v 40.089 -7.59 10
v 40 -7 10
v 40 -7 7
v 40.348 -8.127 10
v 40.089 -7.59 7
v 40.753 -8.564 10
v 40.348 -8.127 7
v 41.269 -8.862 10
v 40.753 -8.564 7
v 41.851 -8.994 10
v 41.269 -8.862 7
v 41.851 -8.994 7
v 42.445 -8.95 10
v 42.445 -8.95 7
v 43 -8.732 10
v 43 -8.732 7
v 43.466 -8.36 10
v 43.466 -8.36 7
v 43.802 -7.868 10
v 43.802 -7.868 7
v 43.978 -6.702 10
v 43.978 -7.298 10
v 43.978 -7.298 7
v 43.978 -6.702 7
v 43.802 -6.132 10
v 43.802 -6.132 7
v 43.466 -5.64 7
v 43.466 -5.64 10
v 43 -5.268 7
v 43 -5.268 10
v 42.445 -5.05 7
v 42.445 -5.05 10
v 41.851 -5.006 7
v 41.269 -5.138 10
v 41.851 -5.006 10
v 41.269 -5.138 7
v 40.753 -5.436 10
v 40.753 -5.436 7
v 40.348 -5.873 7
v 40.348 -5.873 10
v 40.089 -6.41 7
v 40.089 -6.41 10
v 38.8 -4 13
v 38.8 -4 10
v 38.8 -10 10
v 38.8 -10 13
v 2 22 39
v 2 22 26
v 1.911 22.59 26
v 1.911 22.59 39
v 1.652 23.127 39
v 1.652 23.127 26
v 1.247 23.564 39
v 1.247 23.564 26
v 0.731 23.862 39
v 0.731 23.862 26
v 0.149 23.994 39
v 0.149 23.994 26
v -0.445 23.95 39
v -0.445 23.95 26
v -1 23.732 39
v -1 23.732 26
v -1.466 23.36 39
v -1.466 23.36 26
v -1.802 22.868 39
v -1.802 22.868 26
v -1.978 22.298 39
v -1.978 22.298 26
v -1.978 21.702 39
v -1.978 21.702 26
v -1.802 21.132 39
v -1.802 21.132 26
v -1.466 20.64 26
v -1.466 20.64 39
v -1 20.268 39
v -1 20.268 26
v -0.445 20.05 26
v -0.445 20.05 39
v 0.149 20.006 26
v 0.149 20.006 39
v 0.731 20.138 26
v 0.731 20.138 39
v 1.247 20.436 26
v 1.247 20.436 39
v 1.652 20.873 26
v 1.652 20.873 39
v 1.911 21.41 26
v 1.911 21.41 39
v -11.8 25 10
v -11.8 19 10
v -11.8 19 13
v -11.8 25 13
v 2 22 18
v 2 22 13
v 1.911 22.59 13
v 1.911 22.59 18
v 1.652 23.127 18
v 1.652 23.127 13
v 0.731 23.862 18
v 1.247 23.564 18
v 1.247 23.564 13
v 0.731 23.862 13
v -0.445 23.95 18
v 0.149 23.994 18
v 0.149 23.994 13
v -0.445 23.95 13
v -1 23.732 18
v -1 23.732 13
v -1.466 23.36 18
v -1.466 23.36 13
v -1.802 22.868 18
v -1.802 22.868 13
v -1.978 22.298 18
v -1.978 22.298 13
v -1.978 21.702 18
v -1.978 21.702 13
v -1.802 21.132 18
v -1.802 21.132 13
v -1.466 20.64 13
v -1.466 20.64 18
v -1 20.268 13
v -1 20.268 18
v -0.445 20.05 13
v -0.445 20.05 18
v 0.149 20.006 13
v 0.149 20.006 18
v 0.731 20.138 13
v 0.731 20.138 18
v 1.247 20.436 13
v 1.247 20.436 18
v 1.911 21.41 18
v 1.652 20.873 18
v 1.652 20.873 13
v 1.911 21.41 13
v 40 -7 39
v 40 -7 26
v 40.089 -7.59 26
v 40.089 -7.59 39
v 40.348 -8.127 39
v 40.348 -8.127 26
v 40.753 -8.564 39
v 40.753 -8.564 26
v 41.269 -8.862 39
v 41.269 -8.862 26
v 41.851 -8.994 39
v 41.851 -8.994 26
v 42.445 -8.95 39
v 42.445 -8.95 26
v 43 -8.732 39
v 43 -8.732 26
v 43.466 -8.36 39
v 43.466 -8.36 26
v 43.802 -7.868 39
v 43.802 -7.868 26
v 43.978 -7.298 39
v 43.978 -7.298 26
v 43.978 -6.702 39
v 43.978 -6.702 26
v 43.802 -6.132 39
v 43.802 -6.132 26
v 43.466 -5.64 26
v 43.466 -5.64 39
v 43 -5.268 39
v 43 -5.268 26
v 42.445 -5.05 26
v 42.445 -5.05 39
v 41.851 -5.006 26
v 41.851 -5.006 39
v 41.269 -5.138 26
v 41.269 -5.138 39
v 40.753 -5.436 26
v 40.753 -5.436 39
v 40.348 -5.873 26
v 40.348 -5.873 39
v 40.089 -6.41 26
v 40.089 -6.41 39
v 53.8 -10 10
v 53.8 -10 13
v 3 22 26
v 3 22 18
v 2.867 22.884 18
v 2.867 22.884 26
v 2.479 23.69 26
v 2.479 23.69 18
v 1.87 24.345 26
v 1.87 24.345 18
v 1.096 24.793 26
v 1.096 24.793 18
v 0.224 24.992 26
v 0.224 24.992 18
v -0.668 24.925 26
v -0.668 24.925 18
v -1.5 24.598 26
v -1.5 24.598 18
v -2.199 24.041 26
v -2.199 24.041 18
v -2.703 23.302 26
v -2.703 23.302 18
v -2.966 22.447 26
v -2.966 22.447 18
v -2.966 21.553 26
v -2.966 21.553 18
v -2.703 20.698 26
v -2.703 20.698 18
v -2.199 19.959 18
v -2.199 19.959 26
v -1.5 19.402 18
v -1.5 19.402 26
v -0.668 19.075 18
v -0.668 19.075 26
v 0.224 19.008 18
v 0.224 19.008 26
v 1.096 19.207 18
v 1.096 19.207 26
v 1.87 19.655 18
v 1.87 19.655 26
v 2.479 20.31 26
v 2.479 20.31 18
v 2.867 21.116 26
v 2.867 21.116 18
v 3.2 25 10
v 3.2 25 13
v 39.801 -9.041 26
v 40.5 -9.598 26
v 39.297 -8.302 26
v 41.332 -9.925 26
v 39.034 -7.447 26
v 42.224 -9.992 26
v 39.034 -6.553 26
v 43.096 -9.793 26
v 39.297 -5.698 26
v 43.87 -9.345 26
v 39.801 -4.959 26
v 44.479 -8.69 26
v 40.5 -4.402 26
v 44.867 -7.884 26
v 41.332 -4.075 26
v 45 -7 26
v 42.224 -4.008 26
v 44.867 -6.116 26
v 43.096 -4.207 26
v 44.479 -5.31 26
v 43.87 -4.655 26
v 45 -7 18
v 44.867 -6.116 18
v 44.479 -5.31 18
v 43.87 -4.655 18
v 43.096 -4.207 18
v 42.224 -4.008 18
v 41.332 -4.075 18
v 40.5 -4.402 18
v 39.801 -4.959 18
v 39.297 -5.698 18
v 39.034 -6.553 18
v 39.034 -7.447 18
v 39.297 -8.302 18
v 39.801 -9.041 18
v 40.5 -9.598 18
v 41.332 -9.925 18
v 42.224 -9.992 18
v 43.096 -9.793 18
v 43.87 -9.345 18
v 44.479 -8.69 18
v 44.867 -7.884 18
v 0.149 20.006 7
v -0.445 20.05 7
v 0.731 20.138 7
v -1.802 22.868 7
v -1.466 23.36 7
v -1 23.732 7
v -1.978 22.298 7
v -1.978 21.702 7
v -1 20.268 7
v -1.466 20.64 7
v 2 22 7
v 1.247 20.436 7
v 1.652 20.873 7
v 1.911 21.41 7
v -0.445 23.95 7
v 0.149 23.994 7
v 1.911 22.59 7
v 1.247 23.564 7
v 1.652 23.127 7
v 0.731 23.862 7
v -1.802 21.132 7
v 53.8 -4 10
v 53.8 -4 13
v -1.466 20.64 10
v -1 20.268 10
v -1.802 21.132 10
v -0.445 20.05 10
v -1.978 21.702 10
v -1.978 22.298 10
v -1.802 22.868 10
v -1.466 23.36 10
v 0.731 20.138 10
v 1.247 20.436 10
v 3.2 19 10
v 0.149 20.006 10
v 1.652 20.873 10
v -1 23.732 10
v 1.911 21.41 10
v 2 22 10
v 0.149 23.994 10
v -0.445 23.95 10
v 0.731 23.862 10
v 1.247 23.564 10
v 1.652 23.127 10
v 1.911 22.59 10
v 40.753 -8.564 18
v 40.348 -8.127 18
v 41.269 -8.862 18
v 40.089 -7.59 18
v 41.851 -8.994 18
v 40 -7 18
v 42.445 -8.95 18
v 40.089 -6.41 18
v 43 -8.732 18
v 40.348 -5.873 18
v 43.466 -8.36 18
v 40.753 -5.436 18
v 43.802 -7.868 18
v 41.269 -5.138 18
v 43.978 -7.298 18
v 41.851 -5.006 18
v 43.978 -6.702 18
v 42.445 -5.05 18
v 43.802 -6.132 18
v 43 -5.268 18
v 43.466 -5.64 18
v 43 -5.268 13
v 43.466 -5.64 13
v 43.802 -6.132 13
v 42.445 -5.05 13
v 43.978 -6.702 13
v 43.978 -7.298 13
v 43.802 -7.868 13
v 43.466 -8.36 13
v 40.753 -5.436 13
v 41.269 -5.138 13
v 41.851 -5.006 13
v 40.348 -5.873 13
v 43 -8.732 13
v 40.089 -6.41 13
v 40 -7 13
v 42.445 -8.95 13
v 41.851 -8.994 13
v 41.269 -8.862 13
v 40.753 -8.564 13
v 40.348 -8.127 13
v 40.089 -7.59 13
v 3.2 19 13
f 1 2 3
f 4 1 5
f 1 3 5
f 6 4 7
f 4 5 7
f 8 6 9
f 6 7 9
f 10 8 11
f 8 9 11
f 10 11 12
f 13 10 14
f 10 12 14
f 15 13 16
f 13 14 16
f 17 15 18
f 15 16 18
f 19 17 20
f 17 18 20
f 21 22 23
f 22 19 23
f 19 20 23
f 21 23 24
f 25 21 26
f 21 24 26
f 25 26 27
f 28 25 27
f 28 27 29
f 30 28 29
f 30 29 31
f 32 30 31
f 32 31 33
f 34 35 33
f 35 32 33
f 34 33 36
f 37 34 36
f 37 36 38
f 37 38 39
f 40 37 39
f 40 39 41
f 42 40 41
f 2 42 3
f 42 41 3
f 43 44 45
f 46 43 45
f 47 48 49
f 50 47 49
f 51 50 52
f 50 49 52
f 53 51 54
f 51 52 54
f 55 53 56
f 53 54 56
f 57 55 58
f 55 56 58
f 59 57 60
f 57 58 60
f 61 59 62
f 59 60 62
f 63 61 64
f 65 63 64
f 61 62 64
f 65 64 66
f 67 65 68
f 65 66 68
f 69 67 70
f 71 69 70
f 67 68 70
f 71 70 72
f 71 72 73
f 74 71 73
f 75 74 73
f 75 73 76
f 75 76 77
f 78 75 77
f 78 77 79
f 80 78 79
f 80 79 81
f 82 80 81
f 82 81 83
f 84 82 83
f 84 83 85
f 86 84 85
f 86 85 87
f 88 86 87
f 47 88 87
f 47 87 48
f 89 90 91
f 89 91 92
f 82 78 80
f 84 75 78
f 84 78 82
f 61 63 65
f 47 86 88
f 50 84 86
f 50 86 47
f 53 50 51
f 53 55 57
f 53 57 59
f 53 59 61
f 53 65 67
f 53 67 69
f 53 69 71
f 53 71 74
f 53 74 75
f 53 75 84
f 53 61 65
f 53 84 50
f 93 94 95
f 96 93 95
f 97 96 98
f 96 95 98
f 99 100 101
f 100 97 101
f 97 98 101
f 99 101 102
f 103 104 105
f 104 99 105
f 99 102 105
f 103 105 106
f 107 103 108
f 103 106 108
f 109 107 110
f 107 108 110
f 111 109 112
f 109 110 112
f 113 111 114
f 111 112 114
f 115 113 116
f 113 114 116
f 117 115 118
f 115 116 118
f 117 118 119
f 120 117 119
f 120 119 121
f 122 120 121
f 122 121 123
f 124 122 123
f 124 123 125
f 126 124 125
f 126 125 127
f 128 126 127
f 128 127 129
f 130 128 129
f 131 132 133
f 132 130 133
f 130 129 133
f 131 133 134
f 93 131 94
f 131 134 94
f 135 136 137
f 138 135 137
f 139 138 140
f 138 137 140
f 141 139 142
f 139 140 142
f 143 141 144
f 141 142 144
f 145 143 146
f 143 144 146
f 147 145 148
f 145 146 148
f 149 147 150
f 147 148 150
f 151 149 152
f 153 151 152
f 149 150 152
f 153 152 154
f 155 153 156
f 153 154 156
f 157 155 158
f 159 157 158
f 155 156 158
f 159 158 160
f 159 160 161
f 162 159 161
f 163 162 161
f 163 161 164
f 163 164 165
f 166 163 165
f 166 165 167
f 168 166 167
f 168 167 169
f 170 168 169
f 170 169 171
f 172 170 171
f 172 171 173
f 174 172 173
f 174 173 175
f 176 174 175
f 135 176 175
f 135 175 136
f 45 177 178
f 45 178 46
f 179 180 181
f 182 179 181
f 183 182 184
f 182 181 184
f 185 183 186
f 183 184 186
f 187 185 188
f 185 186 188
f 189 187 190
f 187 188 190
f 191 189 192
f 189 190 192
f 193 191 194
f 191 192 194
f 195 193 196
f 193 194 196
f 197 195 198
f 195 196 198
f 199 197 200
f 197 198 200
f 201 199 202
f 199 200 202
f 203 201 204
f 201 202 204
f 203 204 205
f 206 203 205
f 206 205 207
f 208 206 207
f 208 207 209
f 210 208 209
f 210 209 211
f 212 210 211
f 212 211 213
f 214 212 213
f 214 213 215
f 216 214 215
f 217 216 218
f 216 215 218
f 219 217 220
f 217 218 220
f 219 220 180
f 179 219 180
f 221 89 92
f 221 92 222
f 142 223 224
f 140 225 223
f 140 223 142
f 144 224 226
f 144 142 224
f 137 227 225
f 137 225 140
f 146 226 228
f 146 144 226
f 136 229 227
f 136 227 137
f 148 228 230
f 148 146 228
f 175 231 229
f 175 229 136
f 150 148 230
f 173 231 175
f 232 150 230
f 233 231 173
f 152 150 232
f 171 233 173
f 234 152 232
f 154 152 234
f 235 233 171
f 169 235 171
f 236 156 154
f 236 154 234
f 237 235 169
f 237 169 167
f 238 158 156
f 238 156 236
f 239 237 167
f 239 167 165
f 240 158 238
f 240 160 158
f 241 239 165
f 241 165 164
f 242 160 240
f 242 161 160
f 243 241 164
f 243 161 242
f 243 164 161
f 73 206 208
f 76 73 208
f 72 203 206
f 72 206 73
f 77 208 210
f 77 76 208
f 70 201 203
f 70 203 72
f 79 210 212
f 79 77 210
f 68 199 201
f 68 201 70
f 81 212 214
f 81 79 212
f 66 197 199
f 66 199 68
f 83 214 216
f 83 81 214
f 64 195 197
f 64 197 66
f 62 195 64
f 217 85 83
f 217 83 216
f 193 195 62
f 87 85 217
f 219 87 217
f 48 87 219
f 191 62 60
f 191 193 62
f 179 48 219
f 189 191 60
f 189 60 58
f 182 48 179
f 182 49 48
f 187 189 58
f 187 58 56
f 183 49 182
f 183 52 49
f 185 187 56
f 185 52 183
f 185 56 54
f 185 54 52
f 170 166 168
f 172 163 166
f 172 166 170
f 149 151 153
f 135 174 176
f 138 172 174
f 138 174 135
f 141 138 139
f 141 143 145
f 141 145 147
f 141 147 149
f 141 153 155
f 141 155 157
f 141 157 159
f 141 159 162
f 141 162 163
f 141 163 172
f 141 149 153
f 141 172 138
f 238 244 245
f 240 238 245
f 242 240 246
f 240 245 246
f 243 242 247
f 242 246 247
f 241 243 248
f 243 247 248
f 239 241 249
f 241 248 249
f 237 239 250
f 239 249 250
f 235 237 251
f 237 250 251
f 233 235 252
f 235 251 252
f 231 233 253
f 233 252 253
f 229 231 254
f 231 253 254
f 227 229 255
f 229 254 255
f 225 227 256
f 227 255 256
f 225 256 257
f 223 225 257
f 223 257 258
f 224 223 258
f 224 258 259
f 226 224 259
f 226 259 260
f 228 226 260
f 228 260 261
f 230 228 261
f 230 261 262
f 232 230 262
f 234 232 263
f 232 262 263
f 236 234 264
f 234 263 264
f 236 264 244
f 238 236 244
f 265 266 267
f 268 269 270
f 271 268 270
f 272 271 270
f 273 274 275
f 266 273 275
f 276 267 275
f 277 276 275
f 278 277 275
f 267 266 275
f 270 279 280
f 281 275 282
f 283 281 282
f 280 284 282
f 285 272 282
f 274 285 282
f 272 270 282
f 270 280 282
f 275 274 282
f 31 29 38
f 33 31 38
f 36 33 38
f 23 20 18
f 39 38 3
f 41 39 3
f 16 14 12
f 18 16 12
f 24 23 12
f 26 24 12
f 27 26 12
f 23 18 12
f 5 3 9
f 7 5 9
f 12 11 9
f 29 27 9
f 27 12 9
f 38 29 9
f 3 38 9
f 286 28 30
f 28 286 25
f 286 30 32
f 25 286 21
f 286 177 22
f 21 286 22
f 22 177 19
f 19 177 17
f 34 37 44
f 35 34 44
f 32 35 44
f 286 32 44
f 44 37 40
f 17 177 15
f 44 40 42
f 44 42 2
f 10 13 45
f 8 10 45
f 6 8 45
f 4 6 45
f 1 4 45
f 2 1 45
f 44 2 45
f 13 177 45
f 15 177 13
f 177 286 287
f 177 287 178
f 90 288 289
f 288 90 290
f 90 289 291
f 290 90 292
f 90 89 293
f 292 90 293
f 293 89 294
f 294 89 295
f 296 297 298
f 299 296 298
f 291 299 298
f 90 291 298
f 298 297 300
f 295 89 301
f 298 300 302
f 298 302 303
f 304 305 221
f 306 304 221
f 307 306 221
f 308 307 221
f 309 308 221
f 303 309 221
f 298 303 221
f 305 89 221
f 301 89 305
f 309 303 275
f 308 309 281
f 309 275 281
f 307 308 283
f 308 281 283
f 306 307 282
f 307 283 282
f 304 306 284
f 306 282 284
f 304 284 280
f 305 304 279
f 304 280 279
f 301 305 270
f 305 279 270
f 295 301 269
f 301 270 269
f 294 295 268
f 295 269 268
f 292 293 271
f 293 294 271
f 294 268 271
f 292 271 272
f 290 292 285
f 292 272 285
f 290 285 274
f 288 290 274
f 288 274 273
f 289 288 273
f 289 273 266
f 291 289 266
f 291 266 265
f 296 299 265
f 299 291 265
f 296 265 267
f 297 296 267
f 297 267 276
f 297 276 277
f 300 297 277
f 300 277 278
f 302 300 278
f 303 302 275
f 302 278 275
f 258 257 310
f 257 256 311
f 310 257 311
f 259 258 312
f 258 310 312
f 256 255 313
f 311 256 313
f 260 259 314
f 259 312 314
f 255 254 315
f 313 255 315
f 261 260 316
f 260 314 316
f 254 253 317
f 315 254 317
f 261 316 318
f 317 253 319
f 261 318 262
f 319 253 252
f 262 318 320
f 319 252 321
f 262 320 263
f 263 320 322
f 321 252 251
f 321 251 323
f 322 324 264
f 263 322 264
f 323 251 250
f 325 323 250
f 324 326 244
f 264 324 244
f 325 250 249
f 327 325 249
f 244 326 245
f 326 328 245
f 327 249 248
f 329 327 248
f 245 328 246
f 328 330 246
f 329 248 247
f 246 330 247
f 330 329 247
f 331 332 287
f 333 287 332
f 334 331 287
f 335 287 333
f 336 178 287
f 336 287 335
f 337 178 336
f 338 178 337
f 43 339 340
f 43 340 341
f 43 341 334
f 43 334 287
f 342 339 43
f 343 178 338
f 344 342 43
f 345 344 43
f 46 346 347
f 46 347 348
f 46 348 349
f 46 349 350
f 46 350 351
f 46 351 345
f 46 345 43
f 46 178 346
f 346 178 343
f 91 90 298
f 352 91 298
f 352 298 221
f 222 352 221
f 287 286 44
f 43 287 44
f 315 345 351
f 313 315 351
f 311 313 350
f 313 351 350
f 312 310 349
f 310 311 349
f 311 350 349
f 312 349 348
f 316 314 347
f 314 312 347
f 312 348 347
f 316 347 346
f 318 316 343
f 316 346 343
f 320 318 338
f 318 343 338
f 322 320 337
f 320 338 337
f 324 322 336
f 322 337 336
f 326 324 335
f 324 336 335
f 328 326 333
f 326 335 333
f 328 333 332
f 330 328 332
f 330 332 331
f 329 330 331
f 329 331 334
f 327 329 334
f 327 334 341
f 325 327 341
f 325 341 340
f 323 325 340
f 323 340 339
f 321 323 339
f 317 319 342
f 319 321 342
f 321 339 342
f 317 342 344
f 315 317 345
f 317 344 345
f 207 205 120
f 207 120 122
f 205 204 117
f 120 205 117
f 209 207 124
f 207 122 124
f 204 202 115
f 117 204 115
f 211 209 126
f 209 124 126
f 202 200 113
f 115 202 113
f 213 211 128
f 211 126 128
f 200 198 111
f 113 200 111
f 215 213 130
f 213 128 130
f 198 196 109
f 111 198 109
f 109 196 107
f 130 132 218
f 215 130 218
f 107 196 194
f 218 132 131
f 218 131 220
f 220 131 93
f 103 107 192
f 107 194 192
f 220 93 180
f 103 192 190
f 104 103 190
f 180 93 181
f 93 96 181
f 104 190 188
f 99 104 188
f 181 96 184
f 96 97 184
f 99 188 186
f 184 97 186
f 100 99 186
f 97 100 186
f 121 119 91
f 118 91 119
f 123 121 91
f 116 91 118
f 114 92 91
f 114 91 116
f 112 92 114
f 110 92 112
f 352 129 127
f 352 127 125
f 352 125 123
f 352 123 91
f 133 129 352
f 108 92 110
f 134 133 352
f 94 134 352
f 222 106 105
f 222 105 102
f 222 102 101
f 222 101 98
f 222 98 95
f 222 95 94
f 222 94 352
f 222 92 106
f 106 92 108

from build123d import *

# Parameters (mm, degrees)
CYLINDER054_R             = 3
CYLINDER054_DEPTH         = 8
CYLINDER053_R             = 3
CYLINDER053_DEPTH         = 8
BOX016_W                  = 15
BOX016_H                  = 6
BOX016_DEPTH              = 3
CYLINDER052_R             = 1.5
CYLINDER052_DEPTH         = 25
CYLINDER051_R             = 2
CYLINDER051_DEPTH         = 32
FUSION038_PLACEMENT_ANGLE = 180
BOX015_W                  = 15
BOX015_H                  = 6
BOX015_DEPTH              = 3
CYLINDER049_R             = 1.5
CYLINDER049_DEPTH         = 25
CYLINDER048_R             = 2
CYLINDER048_DEPTH         = 32


with BuildPart() as cylinder054:
    # Cylinder054 → Cylinder054 (new body)
    with BuildSketch(Plane(origin=(0, 22, 18), x_dir=(1, 0, 0), z_dir=(0, 0, 1))):
        Circle(CYLINDER054_R)
    extrude(amount=CYLINDER054_DEPTH)


with BuildPart() as cylinder053:
    # Cylinder053 → Cylinder053 (new body)
    with BuildSketch(Plane(origin=(42, -7, 18), x_dir=(1, 0, 0), z_dir=(0, 0, 1))):
        Circle(CYLINDER053_R)
    extrude(amount=CYLINDER053_DEPTH)


with BuildPart() as cube013:
    # Box016 → Box016 (new body)
    with BuildSketch(Plane(origin=(58.2, 67, 3), x_dir=(1, 0, 0), z_dir=(0, 0, 1))):
        with Locations((7.5, 3)):
            Rectangle(BOX016_W, BOX016_H)
    extrude(amount=BOX016_DEPTH)


with BuildPart() as cylinder052:
    # Cylinder052 → Cylinder052 (new body)
    with BuildSketch(Plane(origin=(70, 70, 7), x_dir=(1, 0, 0), z_dir=(0, 0, 1))):
        Circle(CYLINDER052_R)
    extrude(amount=CYLINDER052_DEPTH)


with BuildPart() as fusion038:
    # Cylinder051 → Cylinder051 (new body)
    with BuildSketch(Plane(origin=(70, 70, 0), x_dir=(1, 0, 0), z_dir=(0, 0, 1))):
        Circle(CYLINDER051_R)
    extrude(amount=CYLINDER051_DEPTH)

    # Fusion038: union Cube013, Cylinder052
    add(cube013.part)
    add(cylinder052.part)


with BuildPart() as fusion038_1:
    # Fusion038 placement: moved
    add(fusion038.part.moved(Location((112, 63, 7))).rotate(Axis((112, 63, 7), (0, 0, 1)), FUSION038_PLACEMENT_ANGLE))


with BuildPart() as cube012:
    # Box015 → Box015 (new body)
    with BuildSketch(Plane(origin=(58.2, 67, 3), x_dir=(1, 0, 0), z_dir=(0, 0, 1))):
        with Locations((7.5, 3)):
            Rectangle(BOX015_W, BOX015_H)
    extrude(amount=BOX015_DEPTH)


with BuildPart() as cylinder049:
    # Cylinder049 → Cylinder049 (new body)
    with BuildSketch(Plane(origin=(70, 70, 7), x_dir=(1, 0, 0), z_dir=(0, 0, 1))):
        Circle(CYLINDER049_R)
    extrude(amount=CYLINDER049_DEPTH)


with BuildPart() as fanductbohrung_obsolete:
    # Cylinder048 → Cylinder048 (new body)
    with BuildSketch(Plane(origin=(70, 70, 0), x_dir=(1, 0, 0), z_dir=(0, 0, 1))):
        Circle(CYLINDER048_R)
    extrude(amount=CYLINDER048_DEPTH)

    # Fusion037: union Cube012, Cylinder049
    add(cube012.part)
    add(cylinder049.part)


with BuildPart() as fanductbohrung_obsolete_1:
    # Fusion037 placement: moved
    add(fanductbohrung_obsolete.part.moved(Location((-70, -48, 7))))

    # Fusion039: union Cylinder054, Cylinder053, Fusion038
    add(cylinder054.part)
    add(cylinder053.part)
    add(fusion038_1.part)


solid = fanductbohrung_obsolete_1.part
